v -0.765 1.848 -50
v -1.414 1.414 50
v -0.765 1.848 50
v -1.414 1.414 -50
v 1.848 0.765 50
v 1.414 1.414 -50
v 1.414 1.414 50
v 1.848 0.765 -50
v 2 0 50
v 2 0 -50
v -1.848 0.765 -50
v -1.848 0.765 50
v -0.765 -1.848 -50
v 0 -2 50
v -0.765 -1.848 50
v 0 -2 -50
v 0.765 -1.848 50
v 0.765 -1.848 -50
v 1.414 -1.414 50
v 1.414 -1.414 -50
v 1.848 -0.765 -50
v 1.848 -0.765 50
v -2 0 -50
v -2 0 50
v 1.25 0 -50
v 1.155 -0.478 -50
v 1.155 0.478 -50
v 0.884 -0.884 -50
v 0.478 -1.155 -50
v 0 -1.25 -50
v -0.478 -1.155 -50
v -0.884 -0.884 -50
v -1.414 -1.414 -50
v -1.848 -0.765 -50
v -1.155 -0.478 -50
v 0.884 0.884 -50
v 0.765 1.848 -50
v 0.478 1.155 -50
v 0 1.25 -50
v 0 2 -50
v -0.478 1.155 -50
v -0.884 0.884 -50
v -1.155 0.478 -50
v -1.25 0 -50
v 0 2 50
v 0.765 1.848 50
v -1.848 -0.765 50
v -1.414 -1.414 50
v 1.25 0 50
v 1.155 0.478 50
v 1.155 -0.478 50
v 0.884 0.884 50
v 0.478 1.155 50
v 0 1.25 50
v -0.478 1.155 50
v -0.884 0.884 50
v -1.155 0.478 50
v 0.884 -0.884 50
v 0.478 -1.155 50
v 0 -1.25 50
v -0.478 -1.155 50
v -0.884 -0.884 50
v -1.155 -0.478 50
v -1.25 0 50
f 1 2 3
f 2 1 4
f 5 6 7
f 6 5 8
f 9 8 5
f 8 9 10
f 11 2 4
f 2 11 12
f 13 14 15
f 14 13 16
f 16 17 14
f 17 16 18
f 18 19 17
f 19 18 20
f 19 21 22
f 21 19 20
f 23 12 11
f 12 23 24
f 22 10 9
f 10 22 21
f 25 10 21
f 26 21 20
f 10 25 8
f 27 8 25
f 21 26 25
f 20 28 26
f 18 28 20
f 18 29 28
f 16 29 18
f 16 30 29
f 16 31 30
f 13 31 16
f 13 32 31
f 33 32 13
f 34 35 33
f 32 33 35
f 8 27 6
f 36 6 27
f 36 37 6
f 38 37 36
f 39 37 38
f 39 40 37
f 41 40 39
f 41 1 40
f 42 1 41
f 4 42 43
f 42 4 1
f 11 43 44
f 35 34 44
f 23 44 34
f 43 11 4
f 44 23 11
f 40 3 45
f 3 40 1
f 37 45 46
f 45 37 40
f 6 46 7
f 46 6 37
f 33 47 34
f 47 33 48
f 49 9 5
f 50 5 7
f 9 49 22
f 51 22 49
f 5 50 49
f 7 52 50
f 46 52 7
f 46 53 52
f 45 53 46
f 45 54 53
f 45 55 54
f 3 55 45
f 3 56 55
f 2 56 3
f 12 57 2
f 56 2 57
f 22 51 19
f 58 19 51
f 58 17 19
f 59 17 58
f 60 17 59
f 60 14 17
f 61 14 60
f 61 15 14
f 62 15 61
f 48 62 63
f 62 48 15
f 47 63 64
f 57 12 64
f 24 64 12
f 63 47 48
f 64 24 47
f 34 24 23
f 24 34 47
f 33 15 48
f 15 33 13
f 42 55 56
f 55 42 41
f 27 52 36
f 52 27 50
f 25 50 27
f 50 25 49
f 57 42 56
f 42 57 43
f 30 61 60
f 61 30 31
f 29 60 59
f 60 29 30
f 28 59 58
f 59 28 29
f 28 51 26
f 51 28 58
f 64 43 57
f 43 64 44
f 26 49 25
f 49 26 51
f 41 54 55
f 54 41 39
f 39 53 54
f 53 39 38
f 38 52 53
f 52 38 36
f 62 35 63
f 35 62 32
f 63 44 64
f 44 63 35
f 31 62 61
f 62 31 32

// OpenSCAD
// COBRA Tendon Guide - 100.0mm

$fn = 16;

difference() {
    cylinder(h=100.0, d=4, center=true);
    cylinder(h=102.0, d=2.5, center=true);
}
